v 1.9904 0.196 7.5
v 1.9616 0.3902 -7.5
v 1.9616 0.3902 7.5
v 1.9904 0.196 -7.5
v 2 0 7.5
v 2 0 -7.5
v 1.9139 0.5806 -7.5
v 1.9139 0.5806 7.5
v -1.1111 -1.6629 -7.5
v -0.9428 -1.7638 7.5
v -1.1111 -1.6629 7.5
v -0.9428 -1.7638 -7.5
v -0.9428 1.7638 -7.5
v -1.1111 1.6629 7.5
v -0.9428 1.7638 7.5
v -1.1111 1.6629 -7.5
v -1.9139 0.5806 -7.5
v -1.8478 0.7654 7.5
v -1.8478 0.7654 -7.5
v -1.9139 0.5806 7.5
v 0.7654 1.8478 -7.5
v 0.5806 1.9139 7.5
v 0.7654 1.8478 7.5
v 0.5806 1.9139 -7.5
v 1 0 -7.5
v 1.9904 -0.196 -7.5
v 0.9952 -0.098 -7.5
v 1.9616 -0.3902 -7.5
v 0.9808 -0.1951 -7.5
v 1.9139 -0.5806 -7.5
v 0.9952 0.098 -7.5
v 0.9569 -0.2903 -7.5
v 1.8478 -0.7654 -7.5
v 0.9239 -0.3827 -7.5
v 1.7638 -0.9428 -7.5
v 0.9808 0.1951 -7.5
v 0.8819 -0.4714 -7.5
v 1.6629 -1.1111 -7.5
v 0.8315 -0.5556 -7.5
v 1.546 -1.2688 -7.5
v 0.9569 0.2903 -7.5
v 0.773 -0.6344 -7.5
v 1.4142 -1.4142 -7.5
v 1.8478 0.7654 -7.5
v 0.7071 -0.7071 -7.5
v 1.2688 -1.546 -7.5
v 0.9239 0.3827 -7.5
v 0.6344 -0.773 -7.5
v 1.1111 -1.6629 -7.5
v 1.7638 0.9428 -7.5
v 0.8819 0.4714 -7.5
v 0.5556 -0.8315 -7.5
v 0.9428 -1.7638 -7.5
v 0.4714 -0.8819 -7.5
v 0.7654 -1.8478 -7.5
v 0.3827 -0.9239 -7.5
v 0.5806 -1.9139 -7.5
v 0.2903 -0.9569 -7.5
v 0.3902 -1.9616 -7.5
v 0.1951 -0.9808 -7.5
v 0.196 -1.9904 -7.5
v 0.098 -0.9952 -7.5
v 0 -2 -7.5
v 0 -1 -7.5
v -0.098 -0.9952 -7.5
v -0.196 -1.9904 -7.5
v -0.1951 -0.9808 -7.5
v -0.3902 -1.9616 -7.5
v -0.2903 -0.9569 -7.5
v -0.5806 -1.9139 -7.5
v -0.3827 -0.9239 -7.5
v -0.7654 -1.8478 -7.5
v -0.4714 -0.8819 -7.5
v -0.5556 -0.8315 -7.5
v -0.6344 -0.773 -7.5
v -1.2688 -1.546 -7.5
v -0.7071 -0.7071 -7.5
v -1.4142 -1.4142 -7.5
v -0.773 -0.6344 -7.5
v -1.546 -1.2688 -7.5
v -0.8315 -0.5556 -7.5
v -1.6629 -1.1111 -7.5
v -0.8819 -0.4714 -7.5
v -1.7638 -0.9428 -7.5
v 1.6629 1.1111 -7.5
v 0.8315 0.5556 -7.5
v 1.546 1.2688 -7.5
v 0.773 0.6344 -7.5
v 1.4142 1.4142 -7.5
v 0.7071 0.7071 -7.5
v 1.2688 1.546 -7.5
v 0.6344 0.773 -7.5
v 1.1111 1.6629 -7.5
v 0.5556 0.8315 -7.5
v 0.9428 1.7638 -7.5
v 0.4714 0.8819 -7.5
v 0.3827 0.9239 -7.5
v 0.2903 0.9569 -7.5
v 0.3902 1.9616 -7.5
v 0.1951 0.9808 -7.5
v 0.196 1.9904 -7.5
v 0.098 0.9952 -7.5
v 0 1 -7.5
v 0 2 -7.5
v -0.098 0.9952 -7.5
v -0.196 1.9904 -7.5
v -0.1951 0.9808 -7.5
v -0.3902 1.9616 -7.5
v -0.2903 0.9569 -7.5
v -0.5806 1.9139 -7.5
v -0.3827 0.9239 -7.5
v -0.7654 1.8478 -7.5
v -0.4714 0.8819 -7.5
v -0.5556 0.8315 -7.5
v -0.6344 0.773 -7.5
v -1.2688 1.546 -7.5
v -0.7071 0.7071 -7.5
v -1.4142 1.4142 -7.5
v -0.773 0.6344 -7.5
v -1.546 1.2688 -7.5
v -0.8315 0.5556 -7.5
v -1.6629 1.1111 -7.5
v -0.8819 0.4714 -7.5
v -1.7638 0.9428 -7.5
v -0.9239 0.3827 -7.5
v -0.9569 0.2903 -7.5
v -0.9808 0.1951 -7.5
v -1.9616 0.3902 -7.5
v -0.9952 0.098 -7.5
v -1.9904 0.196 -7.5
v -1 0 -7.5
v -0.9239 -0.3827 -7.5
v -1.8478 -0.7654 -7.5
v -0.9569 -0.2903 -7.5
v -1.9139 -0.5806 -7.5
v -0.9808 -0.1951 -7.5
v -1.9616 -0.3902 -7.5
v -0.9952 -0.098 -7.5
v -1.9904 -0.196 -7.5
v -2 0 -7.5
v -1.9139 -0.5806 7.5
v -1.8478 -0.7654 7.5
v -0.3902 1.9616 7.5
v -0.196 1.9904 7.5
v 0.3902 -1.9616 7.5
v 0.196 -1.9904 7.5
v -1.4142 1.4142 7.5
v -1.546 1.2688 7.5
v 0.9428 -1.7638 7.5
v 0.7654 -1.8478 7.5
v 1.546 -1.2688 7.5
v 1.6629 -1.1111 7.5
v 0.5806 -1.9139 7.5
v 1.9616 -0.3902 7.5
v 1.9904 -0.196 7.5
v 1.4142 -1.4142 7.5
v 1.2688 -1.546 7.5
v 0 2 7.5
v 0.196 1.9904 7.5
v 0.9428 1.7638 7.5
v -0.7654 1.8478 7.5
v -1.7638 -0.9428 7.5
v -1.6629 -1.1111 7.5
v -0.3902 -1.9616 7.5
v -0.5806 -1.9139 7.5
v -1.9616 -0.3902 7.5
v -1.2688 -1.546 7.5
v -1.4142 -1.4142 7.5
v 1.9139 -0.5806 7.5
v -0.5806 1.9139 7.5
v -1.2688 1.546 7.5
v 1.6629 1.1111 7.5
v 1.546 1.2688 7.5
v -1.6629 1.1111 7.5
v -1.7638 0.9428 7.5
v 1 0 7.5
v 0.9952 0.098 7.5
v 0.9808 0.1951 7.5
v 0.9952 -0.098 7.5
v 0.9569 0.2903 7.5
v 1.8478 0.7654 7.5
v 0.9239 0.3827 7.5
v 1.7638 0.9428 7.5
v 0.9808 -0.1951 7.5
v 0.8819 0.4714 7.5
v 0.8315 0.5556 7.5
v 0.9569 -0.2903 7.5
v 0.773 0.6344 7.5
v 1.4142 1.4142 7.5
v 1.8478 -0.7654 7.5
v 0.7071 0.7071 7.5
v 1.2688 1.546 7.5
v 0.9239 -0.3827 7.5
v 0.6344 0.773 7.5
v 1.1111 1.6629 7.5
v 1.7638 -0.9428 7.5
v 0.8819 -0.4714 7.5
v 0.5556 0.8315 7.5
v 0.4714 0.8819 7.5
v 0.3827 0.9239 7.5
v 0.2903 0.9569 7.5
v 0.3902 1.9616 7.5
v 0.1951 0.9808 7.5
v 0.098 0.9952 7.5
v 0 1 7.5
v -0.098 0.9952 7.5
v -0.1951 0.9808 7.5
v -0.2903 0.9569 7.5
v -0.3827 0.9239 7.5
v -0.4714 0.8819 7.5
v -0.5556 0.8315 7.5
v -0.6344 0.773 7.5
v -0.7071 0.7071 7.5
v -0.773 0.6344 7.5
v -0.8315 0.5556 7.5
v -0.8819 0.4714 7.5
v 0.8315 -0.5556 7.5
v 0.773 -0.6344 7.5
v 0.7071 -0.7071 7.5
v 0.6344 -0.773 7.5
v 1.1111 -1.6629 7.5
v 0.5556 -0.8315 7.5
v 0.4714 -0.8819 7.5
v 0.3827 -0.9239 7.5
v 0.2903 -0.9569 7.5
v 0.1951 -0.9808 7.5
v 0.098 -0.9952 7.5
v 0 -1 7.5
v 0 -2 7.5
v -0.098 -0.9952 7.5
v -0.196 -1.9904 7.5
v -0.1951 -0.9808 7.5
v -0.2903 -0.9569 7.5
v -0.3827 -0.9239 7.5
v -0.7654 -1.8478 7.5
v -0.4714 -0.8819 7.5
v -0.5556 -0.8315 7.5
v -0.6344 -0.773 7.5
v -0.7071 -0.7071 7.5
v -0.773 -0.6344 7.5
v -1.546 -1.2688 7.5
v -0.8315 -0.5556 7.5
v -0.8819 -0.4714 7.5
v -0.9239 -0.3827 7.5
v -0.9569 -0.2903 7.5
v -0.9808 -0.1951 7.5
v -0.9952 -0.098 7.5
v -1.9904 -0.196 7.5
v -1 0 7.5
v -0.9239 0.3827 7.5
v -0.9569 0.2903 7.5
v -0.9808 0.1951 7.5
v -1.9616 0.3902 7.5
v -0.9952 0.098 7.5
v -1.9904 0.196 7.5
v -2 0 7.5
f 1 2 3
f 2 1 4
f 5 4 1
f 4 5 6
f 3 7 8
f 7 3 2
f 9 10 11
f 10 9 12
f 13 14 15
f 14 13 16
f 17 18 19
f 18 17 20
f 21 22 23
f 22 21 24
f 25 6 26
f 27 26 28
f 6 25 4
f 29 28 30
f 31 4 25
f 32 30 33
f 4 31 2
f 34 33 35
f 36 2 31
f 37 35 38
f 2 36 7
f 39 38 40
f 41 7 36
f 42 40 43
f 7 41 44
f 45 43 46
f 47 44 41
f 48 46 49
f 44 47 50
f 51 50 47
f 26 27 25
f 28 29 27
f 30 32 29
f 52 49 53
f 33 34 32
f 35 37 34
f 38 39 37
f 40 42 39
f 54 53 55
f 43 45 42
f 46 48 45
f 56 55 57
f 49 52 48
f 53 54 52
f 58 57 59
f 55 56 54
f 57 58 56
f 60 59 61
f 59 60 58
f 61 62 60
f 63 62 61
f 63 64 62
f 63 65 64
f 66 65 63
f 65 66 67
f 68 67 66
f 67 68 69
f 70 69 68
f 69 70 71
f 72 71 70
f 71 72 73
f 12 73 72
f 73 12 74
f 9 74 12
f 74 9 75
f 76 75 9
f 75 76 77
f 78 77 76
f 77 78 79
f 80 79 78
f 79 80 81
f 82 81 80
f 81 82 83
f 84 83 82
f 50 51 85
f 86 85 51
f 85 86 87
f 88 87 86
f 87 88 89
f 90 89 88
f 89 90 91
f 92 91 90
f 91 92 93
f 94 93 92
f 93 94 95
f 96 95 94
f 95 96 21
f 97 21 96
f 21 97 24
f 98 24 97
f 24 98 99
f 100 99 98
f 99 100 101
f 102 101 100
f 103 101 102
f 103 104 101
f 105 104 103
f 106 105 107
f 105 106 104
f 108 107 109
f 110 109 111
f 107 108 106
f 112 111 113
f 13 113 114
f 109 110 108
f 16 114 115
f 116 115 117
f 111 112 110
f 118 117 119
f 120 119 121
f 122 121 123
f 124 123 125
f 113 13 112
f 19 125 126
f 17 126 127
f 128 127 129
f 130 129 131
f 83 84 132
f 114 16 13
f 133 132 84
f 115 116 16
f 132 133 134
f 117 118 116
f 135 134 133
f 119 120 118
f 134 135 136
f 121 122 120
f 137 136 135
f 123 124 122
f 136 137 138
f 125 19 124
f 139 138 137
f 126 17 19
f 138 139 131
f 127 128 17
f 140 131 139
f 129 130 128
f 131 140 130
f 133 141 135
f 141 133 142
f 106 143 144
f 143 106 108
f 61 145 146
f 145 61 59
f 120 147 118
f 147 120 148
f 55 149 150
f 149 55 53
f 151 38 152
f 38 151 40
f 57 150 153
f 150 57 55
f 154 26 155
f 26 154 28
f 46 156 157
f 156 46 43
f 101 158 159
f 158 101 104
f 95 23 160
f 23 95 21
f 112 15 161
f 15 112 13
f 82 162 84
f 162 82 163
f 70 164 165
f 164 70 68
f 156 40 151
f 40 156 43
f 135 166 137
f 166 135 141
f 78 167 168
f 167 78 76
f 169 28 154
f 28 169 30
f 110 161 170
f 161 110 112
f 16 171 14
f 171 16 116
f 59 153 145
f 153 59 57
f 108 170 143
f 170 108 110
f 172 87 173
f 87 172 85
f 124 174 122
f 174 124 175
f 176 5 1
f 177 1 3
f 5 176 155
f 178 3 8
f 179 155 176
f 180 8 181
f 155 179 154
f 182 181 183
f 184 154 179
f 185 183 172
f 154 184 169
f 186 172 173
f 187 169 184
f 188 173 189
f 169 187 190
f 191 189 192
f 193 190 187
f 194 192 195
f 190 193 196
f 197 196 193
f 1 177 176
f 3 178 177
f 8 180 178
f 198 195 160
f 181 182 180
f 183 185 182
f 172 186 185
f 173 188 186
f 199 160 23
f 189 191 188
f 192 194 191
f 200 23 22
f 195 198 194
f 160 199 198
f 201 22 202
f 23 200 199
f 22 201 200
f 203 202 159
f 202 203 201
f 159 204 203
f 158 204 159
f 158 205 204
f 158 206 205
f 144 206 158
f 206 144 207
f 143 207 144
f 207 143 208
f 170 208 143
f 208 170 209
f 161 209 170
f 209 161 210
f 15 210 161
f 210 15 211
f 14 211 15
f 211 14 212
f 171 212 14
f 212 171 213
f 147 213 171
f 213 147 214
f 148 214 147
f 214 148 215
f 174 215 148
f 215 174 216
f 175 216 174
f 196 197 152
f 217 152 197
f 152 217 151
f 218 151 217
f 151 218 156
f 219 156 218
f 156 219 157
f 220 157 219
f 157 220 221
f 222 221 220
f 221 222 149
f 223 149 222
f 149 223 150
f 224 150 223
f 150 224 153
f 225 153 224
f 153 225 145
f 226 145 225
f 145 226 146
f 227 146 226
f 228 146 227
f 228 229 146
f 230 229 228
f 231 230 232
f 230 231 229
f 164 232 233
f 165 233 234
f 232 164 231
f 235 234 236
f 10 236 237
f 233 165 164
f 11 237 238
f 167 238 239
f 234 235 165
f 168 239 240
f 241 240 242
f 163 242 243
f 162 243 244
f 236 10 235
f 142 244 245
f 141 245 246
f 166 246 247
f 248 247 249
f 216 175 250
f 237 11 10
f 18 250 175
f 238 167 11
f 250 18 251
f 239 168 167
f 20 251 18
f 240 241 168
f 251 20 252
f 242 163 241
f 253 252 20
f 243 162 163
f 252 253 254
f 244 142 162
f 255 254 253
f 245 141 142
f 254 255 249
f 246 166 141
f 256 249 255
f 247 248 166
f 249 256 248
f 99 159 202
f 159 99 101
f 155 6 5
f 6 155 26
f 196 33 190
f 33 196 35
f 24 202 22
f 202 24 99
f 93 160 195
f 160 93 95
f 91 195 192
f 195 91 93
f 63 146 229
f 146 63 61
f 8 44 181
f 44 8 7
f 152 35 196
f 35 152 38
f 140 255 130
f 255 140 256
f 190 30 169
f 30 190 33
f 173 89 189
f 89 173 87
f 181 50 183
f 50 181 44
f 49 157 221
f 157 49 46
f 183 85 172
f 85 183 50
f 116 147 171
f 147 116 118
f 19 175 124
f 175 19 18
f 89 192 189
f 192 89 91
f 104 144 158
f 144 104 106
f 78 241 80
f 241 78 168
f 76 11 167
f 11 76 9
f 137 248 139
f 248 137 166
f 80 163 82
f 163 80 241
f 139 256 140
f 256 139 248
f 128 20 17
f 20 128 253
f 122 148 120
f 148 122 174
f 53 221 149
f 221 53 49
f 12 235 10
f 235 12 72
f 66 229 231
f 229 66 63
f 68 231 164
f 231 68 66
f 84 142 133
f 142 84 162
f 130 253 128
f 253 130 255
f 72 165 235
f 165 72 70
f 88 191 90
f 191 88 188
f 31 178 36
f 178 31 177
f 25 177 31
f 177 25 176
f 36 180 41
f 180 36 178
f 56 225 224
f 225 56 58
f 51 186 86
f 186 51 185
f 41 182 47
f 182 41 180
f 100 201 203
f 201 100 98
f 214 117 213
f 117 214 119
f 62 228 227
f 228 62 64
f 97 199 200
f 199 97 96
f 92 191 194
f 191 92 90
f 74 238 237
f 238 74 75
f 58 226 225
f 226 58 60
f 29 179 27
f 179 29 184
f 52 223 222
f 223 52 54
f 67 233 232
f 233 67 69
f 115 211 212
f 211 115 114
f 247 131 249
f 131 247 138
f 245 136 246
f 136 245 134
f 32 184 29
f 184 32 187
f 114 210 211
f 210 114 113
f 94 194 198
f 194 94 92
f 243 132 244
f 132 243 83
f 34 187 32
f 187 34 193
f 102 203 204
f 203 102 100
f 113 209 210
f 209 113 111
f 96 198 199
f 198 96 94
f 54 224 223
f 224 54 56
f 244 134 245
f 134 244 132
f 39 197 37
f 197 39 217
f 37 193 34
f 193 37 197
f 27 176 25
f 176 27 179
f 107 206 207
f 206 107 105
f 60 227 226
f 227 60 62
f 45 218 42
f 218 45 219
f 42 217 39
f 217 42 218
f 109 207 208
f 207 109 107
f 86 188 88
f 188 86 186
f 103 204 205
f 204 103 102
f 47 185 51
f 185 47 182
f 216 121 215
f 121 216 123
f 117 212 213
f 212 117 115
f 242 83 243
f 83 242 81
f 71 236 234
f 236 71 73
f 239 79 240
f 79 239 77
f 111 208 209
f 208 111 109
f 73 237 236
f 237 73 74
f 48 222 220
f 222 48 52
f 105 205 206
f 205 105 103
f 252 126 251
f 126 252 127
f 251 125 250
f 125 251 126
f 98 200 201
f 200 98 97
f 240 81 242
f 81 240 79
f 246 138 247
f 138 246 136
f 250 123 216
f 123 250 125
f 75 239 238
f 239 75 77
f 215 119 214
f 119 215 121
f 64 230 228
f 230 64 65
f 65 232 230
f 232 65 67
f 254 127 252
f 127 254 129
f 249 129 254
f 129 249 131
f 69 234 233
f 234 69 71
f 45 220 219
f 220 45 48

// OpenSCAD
// Parameters
length = 15; //[8:30:1]
center = 1; //[0:1:1]
forced_id = 0; //[0:10:0.1]
type_od = 4; //[2:8:0.1]
type_id = 2; //[1:6:0.1]
id = 2; //[1:10:0.1]
od = 4; //[2:12:0.1]
eps_overlap = 0.8; //[0.5:2:0.1]
path_enabled = 0; //[0:1:1]
path_length = 15; //[8:60:1]

// Tubing - complete geometry
module tubing() {
  color([0.85, 0.85, 0.8]) { // Off-white for PTFE
    if (path_enabled == 0) {
      // Straight tubing
      difference() {
        translate([0, 0, center == 1 ? 0 : length / 2])
          cylinder(r=od/2, h=length, center=true, $fn=64);
        translate([0, 0, center == 1 ? 0 : length / 2])
          cylinder(r=id/2, h=length + 2*eps_overlap, center=true, $fn=64);
      }
    } else {
      // Path sweep placeholder
      difference() {
        translate([0, 0, 0])
          cylinder(r=od/2, h=path_length, center=true, $fn=64);
        translate([0, 0, 0])
          cylinder(r=id/2, h=path_length + 2*eps_overlap, center=true, $fn=64);
      }
    }
  }
}

// Assembly
module assembly() {
  tubing();
}

assembly();
